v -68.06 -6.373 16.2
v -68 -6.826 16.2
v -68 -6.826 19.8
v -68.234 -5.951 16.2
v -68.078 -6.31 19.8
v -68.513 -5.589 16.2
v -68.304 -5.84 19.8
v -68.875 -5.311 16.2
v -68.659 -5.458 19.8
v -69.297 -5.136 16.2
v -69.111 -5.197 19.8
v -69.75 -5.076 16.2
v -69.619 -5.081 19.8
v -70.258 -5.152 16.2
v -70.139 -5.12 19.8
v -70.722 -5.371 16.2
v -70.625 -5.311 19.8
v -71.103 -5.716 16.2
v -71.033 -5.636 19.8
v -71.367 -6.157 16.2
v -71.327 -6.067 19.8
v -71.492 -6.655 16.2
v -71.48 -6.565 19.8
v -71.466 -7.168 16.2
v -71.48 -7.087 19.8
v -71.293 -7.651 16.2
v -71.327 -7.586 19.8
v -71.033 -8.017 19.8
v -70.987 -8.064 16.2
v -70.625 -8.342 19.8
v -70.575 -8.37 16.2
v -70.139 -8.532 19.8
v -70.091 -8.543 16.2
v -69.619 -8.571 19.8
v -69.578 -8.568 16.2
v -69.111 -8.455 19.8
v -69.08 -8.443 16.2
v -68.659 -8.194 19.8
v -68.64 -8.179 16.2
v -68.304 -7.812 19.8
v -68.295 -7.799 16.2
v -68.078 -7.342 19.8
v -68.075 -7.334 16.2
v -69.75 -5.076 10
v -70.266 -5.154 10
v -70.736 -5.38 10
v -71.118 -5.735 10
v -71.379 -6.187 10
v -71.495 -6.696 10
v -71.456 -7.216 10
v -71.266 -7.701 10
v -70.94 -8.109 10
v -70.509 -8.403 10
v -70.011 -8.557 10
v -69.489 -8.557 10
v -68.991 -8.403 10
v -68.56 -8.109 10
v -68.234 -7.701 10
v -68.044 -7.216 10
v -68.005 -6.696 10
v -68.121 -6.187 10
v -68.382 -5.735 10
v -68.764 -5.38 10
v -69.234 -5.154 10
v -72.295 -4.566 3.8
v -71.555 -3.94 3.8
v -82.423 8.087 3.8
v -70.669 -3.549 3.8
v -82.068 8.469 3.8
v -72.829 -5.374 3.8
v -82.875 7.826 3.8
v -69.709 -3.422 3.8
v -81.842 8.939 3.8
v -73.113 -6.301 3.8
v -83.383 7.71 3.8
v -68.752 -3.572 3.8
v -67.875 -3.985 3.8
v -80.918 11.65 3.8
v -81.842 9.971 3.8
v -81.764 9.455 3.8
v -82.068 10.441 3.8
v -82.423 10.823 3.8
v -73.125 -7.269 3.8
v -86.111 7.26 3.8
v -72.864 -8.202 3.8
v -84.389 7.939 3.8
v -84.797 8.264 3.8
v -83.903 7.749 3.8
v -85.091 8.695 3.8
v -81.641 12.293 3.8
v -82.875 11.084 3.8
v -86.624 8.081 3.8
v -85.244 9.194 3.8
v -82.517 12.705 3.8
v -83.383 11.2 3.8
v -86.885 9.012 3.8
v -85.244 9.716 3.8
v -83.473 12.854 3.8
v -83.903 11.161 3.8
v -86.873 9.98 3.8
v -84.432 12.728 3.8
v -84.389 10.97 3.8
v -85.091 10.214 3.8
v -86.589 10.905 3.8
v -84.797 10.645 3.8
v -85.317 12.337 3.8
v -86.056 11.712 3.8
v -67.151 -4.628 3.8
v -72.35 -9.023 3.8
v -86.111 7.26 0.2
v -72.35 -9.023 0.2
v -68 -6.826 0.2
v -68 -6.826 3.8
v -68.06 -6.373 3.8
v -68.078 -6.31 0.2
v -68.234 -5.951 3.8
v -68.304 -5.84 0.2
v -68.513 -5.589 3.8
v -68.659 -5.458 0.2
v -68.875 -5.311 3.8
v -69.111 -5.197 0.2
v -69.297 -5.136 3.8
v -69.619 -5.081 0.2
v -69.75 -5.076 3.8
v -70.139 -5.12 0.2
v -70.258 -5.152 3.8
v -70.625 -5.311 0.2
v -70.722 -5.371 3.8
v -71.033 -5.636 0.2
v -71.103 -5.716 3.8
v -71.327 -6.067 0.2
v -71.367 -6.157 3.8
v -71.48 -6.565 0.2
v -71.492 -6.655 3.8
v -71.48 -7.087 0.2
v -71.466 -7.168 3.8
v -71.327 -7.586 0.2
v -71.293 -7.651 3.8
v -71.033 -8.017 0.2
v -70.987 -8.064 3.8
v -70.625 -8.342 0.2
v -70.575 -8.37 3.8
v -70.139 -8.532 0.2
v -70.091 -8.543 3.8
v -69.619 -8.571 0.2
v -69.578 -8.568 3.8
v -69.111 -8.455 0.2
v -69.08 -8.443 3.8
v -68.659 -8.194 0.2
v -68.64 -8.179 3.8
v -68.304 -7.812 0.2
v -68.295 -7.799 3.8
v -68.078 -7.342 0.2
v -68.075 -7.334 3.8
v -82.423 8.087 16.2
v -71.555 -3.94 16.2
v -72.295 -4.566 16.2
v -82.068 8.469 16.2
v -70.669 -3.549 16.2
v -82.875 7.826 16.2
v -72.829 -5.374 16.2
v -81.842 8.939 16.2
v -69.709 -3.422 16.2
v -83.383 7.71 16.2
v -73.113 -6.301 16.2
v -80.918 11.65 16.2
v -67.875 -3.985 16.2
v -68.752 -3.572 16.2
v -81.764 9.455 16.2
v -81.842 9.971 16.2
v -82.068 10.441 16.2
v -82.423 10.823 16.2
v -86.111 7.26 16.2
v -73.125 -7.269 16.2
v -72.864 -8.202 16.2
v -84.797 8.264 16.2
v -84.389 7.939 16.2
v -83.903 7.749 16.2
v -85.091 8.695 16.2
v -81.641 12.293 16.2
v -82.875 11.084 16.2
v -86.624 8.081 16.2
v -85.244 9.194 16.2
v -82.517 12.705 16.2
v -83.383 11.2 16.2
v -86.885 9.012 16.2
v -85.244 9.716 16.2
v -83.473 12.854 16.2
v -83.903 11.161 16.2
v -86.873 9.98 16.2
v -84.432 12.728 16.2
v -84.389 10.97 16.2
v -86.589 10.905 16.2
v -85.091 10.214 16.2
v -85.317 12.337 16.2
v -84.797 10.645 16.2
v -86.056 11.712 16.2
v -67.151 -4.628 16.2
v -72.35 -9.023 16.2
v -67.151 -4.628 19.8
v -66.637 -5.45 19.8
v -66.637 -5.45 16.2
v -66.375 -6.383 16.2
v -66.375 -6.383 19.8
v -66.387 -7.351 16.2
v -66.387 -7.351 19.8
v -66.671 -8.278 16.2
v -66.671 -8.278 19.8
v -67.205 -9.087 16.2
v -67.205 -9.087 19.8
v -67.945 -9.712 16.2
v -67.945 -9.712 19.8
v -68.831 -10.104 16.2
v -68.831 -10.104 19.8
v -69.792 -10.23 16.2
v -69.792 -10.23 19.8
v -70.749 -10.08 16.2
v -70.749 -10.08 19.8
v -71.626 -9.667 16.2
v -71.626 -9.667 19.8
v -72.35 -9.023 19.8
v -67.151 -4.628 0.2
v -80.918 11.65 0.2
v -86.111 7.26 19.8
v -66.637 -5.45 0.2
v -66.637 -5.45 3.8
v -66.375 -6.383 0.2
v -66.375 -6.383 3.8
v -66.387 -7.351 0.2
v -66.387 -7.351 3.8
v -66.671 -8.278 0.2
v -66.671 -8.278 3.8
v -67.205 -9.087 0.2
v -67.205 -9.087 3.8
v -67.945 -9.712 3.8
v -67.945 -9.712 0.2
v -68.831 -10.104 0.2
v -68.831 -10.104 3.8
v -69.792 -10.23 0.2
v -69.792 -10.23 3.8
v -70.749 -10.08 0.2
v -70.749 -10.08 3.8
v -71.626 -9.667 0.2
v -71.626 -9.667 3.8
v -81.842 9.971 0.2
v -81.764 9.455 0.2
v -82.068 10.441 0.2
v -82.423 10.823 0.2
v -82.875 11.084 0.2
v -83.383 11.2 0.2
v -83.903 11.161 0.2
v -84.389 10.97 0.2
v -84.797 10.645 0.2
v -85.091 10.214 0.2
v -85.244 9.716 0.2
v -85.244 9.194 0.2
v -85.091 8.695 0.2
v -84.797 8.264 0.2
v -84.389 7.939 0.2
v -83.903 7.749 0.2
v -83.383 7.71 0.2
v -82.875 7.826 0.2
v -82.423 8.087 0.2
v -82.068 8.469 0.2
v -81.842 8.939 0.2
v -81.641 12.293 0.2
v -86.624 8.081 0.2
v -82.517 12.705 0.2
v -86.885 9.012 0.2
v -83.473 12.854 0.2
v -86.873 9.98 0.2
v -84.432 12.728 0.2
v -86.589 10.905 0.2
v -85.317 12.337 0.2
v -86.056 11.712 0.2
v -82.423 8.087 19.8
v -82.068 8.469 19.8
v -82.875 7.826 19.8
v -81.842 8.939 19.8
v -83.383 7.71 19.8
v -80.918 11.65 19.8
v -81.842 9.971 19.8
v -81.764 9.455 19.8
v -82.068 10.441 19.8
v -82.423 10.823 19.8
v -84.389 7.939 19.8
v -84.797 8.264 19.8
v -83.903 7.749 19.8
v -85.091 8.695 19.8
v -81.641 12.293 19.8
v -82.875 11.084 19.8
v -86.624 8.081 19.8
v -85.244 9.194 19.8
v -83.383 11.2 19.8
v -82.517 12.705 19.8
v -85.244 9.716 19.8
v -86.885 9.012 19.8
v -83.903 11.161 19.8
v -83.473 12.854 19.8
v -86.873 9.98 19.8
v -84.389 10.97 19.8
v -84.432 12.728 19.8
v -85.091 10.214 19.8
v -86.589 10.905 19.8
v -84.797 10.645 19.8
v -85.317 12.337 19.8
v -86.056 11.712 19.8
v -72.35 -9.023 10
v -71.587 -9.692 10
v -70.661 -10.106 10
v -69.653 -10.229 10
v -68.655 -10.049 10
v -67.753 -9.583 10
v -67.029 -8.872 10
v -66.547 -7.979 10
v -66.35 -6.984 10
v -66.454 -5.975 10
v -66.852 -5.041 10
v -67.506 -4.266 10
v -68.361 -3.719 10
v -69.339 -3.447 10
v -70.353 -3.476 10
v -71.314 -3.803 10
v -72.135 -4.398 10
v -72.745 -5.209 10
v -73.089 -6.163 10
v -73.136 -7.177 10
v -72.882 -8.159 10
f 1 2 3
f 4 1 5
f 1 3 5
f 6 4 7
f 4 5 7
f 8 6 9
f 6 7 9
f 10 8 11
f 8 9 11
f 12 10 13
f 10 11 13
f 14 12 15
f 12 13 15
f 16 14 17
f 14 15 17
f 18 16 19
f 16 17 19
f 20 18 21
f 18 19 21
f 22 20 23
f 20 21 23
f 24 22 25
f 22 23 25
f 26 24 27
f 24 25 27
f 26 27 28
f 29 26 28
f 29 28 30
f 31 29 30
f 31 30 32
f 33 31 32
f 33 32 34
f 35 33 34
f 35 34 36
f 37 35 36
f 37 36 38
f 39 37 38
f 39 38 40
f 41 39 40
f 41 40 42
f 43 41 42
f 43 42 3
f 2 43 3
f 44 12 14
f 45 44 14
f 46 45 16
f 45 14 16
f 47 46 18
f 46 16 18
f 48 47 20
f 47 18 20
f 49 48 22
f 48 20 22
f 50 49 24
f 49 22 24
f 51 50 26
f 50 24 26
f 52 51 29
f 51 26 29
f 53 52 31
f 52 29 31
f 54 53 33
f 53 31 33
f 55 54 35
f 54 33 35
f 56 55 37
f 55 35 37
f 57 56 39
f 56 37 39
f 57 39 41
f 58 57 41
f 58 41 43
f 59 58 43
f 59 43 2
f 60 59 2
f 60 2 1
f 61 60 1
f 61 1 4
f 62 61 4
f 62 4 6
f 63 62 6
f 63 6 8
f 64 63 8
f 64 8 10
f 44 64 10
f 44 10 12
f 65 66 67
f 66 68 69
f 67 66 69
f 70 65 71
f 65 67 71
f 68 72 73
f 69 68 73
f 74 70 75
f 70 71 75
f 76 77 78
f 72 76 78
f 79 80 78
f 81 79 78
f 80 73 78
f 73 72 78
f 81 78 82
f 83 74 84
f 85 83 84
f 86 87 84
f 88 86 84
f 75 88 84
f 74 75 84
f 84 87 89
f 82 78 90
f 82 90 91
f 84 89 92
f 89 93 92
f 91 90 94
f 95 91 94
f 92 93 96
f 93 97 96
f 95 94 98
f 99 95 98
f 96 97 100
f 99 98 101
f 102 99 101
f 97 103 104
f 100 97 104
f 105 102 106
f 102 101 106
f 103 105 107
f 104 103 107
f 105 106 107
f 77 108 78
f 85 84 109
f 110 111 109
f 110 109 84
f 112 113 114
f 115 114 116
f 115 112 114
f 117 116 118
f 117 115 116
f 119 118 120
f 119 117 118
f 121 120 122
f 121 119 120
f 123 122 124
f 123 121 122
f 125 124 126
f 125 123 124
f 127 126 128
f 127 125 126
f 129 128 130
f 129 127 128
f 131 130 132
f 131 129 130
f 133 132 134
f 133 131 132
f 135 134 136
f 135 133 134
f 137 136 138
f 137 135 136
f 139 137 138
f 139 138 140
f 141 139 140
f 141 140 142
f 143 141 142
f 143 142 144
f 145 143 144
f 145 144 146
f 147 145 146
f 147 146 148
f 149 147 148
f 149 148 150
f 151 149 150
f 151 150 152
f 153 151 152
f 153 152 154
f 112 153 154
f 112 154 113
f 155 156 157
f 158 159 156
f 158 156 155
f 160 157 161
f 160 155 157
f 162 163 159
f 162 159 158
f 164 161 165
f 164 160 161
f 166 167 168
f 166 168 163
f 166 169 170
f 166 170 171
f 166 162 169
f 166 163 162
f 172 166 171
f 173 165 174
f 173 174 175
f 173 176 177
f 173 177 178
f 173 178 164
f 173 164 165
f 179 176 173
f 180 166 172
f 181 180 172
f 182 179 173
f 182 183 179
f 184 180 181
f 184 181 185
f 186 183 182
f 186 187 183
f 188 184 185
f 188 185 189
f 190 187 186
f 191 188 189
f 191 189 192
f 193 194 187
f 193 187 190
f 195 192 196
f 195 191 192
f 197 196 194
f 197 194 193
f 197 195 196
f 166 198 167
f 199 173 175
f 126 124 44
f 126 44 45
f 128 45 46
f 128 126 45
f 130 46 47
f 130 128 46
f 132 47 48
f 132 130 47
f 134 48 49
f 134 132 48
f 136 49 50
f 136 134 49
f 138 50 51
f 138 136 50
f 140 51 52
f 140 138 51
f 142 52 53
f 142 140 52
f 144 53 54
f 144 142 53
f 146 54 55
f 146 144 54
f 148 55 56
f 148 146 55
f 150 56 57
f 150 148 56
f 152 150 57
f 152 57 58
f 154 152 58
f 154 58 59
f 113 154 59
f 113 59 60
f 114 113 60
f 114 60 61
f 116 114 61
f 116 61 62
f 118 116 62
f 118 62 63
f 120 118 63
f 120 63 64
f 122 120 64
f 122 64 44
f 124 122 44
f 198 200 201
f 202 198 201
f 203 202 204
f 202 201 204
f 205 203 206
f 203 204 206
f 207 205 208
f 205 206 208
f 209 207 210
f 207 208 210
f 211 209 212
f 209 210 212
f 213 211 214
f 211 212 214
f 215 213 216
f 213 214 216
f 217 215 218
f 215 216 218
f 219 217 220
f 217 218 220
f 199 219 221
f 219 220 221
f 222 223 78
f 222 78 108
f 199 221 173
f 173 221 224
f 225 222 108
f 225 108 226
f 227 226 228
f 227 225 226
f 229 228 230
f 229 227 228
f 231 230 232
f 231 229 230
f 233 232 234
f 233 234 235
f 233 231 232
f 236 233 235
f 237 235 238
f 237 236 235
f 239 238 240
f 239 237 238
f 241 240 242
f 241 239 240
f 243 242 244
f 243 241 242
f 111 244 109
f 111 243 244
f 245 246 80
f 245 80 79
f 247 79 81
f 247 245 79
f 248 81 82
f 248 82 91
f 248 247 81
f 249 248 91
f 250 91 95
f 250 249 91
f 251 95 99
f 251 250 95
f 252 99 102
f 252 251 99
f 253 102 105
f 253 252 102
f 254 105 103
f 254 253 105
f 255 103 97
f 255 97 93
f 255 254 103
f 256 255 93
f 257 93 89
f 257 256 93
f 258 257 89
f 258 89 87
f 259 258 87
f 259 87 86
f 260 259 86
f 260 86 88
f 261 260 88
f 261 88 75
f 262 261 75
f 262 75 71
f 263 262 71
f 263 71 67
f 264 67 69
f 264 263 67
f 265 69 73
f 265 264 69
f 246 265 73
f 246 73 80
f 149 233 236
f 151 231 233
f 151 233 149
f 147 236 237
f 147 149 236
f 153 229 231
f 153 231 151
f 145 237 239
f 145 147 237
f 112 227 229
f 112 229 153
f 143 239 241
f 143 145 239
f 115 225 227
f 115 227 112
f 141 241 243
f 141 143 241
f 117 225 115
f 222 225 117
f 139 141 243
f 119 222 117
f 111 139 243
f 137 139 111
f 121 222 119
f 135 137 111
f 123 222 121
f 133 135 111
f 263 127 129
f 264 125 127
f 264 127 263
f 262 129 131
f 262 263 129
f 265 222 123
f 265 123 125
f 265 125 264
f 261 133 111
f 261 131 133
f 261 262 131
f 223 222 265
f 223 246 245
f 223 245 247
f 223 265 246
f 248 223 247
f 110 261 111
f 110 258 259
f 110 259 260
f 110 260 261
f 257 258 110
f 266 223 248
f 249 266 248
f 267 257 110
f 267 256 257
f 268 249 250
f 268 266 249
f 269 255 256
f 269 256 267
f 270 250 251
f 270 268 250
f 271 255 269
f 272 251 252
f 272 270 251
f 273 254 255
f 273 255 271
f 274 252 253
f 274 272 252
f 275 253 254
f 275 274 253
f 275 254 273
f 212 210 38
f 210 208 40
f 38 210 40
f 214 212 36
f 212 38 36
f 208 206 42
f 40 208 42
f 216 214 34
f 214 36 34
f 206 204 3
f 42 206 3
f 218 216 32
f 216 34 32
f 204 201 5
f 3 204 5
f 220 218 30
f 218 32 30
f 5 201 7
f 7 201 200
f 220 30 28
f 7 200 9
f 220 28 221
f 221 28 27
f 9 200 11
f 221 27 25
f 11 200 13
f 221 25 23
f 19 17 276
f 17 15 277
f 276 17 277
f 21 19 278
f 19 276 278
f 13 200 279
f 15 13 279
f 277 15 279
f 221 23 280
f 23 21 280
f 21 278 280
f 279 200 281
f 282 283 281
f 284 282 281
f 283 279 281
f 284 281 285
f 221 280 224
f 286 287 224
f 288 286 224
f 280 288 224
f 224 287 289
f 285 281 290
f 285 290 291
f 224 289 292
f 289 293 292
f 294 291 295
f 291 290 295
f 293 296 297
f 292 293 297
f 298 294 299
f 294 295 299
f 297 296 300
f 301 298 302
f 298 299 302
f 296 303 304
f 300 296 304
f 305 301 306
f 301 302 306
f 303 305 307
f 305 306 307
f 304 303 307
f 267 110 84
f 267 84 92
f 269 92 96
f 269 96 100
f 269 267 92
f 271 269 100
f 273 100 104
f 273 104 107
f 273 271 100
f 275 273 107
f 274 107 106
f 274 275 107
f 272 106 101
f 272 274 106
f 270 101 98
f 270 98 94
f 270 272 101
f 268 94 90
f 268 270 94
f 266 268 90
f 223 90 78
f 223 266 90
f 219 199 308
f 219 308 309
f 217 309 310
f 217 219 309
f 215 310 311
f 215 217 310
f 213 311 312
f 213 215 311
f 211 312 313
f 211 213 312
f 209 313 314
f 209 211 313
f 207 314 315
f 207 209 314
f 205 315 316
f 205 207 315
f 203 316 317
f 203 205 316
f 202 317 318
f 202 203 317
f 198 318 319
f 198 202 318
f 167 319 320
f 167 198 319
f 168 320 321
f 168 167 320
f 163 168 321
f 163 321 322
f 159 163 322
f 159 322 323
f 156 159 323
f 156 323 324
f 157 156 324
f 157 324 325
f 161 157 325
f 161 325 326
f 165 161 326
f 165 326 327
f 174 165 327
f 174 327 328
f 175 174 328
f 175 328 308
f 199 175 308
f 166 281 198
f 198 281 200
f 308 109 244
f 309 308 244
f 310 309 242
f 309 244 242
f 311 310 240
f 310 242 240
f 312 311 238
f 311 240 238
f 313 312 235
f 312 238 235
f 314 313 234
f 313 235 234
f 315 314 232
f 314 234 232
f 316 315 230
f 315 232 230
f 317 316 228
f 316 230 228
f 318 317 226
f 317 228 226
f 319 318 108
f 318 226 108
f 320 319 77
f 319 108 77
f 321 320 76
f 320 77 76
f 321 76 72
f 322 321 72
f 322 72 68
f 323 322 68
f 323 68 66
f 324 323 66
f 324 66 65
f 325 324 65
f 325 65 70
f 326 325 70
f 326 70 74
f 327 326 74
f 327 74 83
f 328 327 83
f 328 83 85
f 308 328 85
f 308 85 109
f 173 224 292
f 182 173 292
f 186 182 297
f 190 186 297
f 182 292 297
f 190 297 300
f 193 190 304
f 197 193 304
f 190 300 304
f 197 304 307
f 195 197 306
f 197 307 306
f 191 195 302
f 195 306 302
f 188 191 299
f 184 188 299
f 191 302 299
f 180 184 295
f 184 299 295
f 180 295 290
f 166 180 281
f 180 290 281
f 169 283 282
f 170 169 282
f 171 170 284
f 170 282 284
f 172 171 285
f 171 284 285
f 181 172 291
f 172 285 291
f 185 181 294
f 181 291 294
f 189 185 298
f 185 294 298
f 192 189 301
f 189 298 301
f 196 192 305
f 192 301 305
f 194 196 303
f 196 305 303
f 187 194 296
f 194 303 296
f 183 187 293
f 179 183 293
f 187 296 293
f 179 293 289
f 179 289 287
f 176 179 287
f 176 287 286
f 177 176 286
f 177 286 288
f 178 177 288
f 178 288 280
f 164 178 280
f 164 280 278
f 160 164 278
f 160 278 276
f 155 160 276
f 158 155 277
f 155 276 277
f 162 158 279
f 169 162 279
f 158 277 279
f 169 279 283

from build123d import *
from build123d.topology import SkipClean

# Parameters (mm, degrees)
SALIENTE_EXTRUIR1_START = 0.2
CROQUIS1_R              = 1.75
SALIENTE_EXTRUIR1_DEPTH = 3.6
CROQUIS2_R              = 3.40408827
CROQUIS2_R_2            = 1.75
SALIENTE_EXTRUIR2_DEPTH = 6.2


with BuildPart() as part:
    # Croquis1 → Saliente-Extruir1 (new body)
    with BuildSketch(Plane.XY.offset(SALIENTE_EXTRUIR1_START)):
        with BuildLine():
            Line((-80.917805582, 11.650275301), (-67.150813208, -4.628100839))
            ThreePointArc((-67.150813208, -4.628100839), (-67.552307173, -9.425900411), (-72.350029665, -9.023486412))
            Line((-72.350029665, -9.023486412), (-86.110777841, 7.260168535))
            ThreePointArc((-86.110777841, 7.260168535), (-85.708924205, 12.051210184), (-80.917805582, 11.650275301))
        make_face()
        with Locations((-69.75, -6.826292135)):
            Circle(CROQUIS1_R, mode=Mode.SUBTRACT)
        with Locations((-83.513870781, 9.454724007)):
            Circle(CROQUIS1_R, mode=Mode.SUBTRACT)
    saliente_extruir1 = extrude(amount=SALIENTE_EXTRUIR1_DEPTH)

    # Croquis2 → Saliente-Extruir2 (add)
    with SkipClean():  # the faces are left unmerged after this step: merging them gives an invalid solid
        with BuildSketch(Plane.XY.offset(3.8)):
            with Locations(Location((-69.75, -6.826292135, 0), (0, 0, 220.199985321))):
                Circle(CROQUIS2_R)
            with Locations(Location((-69.75, -6.826292135, 0), (0, 0, 90))):
                Circle(CROQUIS2_R_2, mode=Mode.SUBTRACT)
        saliente_extruir2 = extrude(amount=SALIENTE_EXTRUIR2_DEPTH)

    # Simetría1: Saliente-Extruir2 across plane
    with SkipClean():  # the faces are left unmerged after this step: merging them gives an invalid solid
        add(saliente_extruir2.mirror(Plane(origin=(0, 0, 10), x_dir=(1, 0, 0), z_dir=(0, 0, -1))))

    # Simetría4: Saliente-Extruir1 across plane
    with SkipClean():  # the faces are left unmerged after this step: merging them gives an invalid solid
        add(saliente_extruir1.mirror(Plane(origin=(0, 0, 10), x_dir=(1, 0, 0), z_dir=(0, 0, -1))))


solid = part.part
